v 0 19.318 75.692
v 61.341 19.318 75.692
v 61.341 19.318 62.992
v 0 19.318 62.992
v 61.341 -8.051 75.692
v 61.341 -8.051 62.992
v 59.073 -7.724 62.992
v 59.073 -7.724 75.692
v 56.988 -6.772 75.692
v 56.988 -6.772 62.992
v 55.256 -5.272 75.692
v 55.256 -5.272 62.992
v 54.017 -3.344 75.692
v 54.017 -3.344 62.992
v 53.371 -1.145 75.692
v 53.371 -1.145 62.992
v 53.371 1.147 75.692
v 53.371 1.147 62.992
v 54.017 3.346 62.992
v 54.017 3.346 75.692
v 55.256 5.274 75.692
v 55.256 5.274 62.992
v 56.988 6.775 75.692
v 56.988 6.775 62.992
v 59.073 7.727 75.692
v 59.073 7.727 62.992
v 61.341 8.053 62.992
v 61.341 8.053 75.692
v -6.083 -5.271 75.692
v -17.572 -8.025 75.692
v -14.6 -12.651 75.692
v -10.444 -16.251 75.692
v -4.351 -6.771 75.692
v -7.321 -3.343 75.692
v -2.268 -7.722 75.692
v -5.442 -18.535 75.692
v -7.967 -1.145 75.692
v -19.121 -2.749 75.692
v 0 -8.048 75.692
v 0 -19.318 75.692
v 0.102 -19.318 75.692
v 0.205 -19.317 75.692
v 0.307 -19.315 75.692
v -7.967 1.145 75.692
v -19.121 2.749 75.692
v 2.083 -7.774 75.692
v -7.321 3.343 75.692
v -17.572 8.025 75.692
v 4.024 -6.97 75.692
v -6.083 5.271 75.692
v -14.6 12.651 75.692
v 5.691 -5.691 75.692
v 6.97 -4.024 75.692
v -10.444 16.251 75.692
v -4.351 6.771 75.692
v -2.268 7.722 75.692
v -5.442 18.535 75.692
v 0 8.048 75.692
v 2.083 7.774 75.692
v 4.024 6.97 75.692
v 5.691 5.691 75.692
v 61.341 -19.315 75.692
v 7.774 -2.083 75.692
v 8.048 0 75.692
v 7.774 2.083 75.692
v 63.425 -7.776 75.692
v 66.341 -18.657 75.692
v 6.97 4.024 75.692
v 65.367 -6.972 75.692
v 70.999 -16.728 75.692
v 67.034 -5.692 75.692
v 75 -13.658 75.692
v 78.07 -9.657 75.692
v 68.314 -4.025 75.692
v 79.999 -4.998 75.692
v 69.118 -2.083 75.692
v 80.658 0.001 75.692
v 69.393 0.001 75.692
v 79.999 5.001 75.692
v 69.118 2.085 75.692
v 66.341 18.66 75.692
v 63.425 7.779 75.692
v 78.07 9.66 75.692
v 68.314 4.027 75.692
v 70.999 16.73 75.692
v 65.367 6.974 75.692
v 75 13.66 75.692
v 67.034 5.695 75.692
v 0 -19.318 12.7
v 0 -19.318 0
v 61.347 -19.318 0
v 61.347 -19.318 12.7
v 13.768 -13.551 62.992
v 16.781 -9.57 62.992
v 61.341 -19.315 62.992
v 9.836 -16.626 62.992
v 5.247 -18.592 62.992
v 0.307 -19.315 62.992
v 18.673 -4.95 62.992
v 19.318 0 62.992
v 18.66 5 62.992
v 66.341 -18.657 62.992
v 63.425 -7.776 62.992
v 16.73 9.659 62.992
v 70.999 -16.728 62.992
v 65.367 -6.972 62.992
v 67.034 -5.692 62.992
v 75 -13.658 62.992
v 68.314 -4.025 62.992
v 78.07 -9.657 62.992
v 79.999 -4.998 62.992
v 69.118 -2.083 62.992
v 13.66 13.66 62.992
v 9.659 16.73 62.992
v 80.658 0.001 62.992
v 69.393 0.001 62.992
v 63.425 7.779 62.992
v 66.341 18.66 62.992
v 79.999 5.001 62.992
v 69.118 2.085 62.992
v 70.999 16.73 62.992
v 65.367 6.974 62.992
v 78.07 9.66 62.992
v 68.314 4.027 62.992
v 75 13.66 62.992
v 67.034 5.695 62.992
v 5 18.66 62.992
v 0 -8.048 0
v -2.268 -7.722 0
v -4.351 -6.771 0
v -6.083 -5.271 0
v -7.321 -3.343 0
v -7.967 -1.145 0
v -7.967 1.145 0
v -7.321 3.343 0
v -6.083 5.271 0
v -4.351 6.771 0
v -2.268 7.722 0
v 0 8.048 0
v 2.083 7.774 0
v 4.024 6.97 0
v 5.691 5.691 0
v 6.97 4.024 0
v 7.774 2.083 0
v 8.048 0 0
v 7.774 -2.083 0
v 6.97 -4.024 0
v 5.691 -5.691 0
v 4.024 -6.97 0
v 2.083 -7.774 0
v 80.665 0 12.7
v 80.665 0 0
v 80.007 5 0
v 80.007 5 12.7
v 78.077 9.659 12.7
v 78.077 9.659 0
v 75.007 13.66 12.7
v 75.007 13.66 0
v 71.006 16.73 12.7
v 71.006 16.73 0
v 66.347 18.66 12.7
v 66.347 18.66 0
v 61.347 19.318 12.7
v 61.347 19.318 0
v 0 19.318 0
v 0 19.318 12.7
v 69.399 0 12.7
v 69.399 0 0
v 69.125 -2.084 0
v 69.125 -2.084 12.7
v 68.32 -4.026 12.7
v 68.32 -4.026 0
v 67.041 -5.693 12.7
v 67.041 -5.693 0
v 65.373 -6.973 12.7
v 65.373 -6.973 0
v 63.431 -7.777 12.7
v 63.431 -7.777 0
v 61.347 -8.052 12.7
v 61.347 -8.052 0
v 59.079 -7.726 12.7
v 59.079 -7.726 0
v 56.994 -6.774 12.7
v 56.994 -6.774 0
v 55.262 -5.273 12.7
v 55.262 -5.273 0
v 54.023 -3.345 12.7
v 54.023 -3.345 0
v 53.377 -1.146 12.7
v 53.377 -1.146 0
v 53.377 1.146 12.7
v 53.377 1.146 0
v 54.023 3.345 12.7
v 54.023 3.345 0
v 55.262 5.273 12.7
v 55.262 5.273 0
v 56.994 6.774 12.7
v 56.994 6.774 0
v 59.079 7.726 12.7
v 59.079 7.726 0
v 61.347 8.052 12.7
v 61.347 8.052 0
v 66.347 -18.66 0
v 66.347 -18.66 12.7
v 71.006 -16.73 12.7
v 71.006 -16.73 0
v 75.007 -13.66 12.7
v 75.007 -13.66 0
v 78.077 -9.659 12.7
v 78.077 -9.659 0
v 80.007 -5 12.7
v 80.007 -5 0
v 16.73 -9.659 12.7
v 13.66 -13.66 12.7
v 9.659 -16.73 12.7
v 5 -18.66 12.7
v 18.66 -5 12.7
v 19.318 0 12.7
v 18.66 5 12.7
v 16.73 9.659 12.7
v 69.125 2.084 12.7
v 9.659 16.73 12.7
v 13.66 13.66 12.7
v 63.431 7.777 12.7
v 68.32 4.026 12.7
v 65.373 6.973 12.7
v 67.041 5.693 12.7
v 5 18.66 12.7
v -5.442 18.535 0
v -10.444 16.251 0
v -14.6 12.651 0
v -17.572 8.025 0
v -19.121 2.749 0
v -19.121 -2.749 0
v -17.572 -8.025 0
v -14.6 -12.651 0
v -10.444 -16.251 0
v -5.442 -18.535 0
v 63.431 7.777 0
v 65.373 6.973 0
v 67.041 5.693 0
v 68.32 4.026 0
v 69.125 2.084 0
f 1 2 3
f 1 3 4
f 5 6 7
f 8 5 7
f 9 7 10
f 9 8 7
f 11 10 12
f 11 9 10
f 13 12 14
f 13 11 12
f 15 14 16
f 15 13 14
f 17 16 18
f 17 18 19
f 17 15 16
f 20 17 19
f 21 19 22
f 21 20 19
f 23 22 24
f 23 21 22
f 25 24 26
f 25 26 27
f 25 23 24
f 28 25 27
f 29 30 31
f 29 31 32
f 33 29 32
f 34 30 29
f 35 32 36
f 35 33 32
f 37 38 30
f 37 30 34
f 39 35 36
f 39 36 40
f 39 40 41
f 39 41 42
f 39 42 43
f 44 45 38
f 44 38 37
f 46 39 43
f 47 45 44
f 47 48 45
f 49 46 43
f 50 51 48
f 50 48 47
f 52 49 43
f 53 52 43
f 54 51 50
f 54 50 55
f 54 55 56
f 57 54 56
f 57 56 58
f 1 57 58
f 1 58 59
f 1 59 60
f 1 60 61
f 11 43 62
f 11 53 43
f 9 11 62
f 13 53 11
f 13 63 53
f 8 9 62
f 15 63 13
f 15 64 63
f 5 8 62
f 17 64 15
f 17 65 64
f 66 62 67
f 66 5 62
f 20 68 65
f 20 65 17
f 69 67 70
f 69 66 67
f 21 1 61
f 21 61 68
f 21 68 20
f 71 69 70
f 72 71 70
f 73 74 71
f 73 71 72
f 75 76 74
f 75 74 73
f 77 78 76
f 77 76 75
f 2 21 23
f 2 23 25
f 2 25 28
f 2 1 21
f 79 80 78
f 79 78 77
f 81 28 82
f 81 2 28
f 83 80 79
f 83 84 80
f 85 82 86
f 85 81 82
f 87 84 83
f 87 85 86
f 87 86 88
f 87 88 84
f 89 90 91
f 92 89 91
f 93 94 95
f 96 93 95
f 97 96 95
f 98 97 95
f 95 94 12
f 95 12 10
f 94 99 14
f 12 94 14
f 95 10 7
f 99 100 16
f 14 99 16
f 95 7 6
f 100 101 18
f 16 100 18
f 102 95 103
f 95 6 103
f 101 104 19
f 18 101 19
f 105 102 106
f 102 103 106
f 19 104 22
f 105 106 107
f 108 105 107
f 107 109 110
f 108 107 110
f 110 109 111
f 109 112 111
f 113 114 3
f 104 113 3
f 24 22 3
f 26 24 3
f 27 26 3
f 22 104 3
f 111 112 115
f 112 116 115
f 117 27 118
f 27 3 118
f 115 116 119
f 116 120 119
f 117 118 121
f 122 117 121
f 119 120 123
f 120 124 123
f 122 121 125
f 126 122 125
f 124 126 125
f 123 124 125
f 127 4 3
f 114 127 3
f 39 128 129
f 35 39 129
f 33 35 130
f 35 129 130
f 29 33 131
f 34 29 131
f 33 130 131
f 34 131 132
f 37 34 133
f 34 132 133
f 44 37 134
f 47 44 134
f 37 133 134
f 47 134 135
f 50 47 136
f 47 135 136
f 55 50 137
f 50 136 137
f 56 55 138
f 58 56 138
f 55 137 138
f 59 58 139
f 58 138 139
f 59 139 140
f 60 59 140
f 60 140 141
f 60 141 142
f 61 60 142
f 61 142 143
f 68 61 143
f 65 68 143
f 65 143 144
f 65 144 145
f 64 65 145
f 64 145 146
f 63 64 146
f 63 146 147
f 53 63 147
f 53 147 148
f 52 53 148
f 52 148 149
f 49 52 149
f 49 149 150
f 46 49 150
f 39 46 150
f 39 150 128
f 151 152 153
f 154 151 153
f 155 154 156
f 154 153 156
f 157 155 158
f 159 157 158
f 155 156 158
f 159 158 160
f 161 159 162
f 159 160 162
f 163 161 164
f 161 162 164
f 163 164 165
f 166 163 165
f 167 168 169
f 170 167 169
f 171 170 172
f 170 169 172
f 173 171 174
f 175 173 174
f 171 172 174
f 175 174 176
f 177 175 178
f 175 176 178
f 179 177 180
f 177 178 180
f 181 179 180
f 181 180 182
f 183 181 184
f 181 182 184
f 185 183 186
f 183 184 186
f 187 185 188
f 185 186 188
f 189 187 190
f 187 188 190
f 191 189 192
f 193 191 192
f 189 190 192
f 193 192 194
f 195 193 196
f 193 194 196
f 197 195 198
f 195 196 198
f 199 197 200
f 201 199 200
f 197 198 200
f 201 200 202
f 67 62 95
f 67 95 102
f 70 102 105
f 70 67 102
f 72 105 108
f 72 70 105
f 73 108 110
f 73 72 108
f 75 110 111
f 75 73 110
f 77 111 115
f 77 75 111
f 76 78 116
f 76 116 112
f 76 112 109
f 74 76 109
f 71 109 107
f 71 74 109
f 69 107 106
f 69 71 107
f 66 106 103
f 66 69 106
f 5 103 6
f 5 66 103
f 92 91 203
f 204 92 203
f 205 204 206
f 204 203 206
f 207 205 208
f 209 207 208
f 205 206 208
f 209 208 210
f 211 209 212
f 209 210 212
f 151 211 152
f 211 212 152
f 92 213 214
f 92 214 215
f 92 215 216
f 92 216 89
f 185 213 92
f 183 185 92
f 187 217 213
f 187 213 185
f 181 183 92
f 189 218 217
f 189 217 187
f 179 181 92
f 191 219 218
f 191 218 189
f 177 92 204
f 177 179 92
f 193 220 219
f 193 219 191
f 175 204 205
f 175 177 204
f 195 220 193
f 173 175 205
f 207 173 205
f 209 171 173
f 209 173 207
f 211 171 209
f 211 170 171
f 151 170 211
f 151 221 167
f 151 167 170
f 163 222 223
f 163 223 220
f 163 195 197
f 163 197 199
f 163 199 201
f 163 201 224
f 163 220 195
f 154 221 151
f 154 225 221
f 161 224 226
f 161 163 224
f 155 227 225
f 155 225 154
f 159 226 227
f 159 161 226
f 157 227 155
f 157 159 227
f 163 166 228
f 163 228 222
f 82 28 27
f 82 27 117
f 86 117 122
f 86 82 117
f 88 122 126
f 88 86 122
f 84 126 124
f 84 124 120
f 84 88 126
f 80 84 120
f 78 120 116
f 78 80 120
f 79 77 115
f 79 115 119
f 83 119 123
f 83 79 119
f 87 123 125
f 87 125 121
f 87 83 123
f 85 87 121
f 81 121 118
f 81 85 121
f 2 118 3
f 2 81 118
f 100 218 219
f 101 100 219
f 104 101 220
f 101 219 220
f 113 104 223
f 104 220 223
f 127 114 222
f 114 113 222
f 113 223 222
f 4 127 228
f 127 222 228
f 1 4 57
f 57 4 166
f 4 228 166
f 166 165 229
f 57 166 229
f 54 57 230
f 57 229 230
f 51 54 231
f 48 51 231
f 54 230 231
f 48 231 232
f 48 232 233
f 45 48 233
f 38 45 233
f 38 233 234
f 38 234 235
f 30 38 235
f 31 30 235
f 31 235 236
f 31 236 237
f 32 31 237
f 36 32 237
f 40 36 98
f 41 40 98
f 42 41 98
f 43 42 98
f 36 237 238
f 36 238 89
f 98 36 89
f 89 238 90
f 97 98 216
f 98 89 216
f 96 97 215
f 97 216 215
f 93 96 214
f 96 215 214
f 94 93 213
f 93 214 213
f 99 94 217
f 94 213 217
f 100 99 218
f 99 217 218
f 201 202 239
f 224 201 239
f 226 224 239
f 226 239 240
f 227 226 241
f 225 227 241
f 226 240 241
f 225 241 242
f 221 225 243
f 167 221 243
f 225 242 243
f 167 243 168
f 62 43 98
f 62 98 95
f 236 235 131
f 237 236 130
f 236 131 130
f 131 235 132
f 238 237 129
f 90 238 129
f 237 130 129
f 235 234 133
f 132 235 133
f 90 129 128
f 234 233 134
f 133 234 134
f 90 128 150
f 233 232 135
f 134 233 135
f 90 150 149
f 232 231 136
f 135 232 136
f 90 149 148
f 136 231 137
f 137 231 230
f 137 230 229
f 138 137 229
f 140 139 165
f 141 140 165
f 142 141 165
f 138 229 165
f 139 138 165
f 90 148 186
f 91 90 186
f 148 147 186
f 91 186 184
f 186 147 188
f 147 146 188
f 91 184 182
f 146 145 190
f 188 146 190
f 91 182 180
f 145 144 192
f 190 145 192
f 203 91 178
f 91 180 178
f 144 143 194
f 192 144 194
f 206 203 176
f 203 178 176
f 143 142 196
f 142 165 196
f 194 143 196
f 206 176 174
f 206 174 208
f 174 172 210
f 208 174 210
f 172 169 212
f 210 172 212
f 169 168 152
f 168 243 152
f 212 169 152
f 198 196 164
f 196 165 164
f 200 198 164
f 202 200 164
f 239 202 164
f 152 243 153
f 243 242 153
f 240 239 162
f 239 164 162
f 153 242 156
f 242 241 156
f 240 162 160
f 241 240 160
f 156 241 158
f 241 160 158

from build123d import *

# Parameters (mm, degrees)
F1_DEPTH = 12.7
F2_DEPTH = 75.692
F4_DEPTH = 12.7


with BuildPart() as f1:
    # F0 (on Top) → F1 (new body)
    with BuildSketch(Plane.XY):
        with BuildLine():
            ThreePointArc((0, 8.0484505981), (5.691113996, 5.691113996), (8.0484505981, 0))
            ThreePointArc((8.0484505981, 0), (5.691113996, -5.691113996), (0, -8.0484505981))
            Line((0, -8.0484505981), (0, -19.3179212511))
            ThreePointArc((0, -19.3179212511), (13.6598331151, -13.6598331151), (19.3179212511, 0))
            ThreePointArc((19.3179212511, 0), (13.6598331151, 13.6598331151), (0, 19.3179212511))
            Line((0, 19.3179212511), (0, 8.0484505981))
        make_face()
        with BuildLine():
            ThreePointArc((0, -8.0484505981), (-8.0484505981, 0), (0, 8.0484505981))
            Line((0, 8.0484505981), (0, 19.3179212511))
            ThreePointArc((0, 19.3179212511), (-19.3179212511, 0), (0, -19.3179212511))
            Line((0, -19.3179212511), (0, -8.0484505981))
        make_face()
        with BuildLine():
            Line((61.3472089171, 19.3179212511), (0, 19.3179212511))
            ThreePointArc((0, 19.3179212511), (13.6598331151, 13.6598331151), (19.3179212511, 0))
            ThreePointArc((19.3179212511, 0), (13.6598331151, -13.6598331151), (0, -19.3179212511))
            Line((0, -19.3179212511), (61.3472089171, -19.3179212511))
            ThreePointArc((61.3472089171, -19.3179212511), (42.0292876661, 0), (61.3472089171, 19.3179212511))
        make_face()
        with BuildLine():
            ThreePointArc((80.6651301682, 0), (75.0070420322, 13.6598331151), (61.3472089171, 19.3179212511))
            Line((61.3472089171, 19.3179212511), (61.3472089171, 8.0518))
            ThreePointArc((61.3472089171, 8.0518), (67.0406912979, 5.6934823808), (69.3990089171, 0))
            ThreePointArc((69.3990089171, 0), (67.0406912979, -5.6934823808), (61.3472089171, -8.0518))
            Line((61.3472089171, -8.0518), (61.3472089171, -19.3179212511))
            ThreePointArc((61.3472089171, -19.3179212511), (75.0070420322, -13.6598331151), (80.6651301682, 0))
        make_face()
        with BuildLine():
            Line((61.3472089171, 8.0518), (61.3472089171, 19.3179212511))
            ThreePointArc((61.3472089171, 19.3179212511), (42.0292876661, 0), (61.3472089171, -19.3179212511))
            Line((61.3472089171, -19.3179212511), (61.3472089171, -8.0518))
            ThreePointArc((61.3472089171, -8.0518), (53.2954089171, 0), (61.3472089171, 8.0518))
        make_face()
    extrude(amount=F1_DEPTH)

    # F0 (on Top) → F2 (join)
    with BuildSketch(Plane.XY):
        with BuildLine():
            ThreePointArc((0, -8.0484505981), (-8.0484505981, 0), (0, 8.0484505981))
            Line((0, 8.0484505981), (0, 19.3179212511))
            ThreePointArc((0, 19.3179212511), (-19.3179212511, 0), (0, -19.3179212511))
            Line((0, -19.3179212511), (0, -8.0484505981))
        make_face()
        with BuildLine():
            ThreePointArc((0, 8.0484505981), (5.691113996, 5.691113996), (8.0484505981, 0))
            ThreePointArc((8.0484505981, 0), (5.691113996, -5.691113996), (0, -8.0484505981))
            Line((0, -8.0484505981), (0, -19.3179212511))
            ThreePointArc((0, -19.3179212511), (13.6598331151, -13.6598331151), (19.3179212511, 0))
            ThreePointArc((19.3179212511, 0), (13.6598331151, 13.6598331151), (0, 19.3179212511))
            Line((0, 19.3179212511), (0, 8.0484505981))
        make_face()
    extrude(amount=F2_DEPTH)

    # F3 (on face) → F4 (join)
    with BuildSketch(Plane.XY.offset(75.692)):
        with BuildLine():
            ThreePointArc((19.3179212511, 0), (13.6598331151, 13.6598331151), (0, 19.3179212511))
            Line((0, 19.3179212511), (0, 8.0518))
            ThreePointArc((0, 8.0518), (5.6934823808, 5.6934823808), (8.0518, 0))
            ThreePointArc((8.0518, 0), (5.6934823808, -5.6934823808), (0, -8.0518))
            Line((0, -8.0518), (0, -19.3154787489))
            Line((0, -19.3154787489), (0.3071842465, -19.3154787489))
            ThreePointArc((0.3071842465, -19.3154787489), (13.7680107958, -13.5507918658), (19.3179212511, 0))
        make_face()
        with BuildLine():
            Line((61.341, 19.3179212511), (0, 19.3179212511))
            ThreePointArc((0, 19.3179212511), (13.6598331151, 13.6598331151), (19.3179212511, 0))
            ThreePointArc((19.3179212511, 0), (13.7680107958, -13.5507918658), (0.3071842465, -19.3154787489))
            Line((0.3071842465, -19.3154787489), (61.341, -19.3154787489))
            ThreePointArc((61.341, -19.3154787489), (42.0243, 0.0012212511), (61.341, 19.3179212511))
        make_face()
        with BuildLine():
            Line((0, 8.0518), (0, 19.3179212511))
            ThreePointArc((0, 19.3179212511), (-19.3173106159, -0.1535969784), (0.3071842465, -19.3154787489))
            Line((0.3071842465, -19.3154787489), (0, -19.3154787489))
            Line((0, -19.3154787489), (0, -8.0518))
            ThreePointArc((0, -8.0518), (-8.0518, 0), (0, 8.0518))
        make_face()
        with BuildLine():
            ThreePointArc((80.6577, 0.0012212511), (74.9999695601, 13.6601908112), (61.341, 19.3179212511))
            Line((61.341, 19.3179212511), (61.341, 8.0530212511))
            ThreePointArc((61.341, 8.0530212511), (67.0344823808, 5.6947036318), (69.3928, 0.0012212511))
            ThreePointArc((69.3928, 0.0012212511), (67.0344823808, -5.6922611297), (61.341, -8.0505787489))
            Line((61.341, -8.0505787489), (61.341, -19.3154787489))
            ThreePointArc((61.341, -19.3154787489), (74.9999695601, -13.6577483091), (80.6577, 0.0012212511))
        make_face()
        with BuildLine():
            Line((61.341, 8.0530212511), (61.341, 19.3179212511))
            ThreePointArc((61.341, 19.3179212511), (42.0243, 0.0012212511), (61.341, -19.3154787489))
            Line((61.341, -19.3154787489), (61.341, -8.0505787489))
            ThreePointArc((61.341, -8.0505787489), (53.2892, 0.0012212511), (61.341, 8.0530212511))
        make_face()
    extrude(amount=-F4_DEPTH)


solid = f1.part
